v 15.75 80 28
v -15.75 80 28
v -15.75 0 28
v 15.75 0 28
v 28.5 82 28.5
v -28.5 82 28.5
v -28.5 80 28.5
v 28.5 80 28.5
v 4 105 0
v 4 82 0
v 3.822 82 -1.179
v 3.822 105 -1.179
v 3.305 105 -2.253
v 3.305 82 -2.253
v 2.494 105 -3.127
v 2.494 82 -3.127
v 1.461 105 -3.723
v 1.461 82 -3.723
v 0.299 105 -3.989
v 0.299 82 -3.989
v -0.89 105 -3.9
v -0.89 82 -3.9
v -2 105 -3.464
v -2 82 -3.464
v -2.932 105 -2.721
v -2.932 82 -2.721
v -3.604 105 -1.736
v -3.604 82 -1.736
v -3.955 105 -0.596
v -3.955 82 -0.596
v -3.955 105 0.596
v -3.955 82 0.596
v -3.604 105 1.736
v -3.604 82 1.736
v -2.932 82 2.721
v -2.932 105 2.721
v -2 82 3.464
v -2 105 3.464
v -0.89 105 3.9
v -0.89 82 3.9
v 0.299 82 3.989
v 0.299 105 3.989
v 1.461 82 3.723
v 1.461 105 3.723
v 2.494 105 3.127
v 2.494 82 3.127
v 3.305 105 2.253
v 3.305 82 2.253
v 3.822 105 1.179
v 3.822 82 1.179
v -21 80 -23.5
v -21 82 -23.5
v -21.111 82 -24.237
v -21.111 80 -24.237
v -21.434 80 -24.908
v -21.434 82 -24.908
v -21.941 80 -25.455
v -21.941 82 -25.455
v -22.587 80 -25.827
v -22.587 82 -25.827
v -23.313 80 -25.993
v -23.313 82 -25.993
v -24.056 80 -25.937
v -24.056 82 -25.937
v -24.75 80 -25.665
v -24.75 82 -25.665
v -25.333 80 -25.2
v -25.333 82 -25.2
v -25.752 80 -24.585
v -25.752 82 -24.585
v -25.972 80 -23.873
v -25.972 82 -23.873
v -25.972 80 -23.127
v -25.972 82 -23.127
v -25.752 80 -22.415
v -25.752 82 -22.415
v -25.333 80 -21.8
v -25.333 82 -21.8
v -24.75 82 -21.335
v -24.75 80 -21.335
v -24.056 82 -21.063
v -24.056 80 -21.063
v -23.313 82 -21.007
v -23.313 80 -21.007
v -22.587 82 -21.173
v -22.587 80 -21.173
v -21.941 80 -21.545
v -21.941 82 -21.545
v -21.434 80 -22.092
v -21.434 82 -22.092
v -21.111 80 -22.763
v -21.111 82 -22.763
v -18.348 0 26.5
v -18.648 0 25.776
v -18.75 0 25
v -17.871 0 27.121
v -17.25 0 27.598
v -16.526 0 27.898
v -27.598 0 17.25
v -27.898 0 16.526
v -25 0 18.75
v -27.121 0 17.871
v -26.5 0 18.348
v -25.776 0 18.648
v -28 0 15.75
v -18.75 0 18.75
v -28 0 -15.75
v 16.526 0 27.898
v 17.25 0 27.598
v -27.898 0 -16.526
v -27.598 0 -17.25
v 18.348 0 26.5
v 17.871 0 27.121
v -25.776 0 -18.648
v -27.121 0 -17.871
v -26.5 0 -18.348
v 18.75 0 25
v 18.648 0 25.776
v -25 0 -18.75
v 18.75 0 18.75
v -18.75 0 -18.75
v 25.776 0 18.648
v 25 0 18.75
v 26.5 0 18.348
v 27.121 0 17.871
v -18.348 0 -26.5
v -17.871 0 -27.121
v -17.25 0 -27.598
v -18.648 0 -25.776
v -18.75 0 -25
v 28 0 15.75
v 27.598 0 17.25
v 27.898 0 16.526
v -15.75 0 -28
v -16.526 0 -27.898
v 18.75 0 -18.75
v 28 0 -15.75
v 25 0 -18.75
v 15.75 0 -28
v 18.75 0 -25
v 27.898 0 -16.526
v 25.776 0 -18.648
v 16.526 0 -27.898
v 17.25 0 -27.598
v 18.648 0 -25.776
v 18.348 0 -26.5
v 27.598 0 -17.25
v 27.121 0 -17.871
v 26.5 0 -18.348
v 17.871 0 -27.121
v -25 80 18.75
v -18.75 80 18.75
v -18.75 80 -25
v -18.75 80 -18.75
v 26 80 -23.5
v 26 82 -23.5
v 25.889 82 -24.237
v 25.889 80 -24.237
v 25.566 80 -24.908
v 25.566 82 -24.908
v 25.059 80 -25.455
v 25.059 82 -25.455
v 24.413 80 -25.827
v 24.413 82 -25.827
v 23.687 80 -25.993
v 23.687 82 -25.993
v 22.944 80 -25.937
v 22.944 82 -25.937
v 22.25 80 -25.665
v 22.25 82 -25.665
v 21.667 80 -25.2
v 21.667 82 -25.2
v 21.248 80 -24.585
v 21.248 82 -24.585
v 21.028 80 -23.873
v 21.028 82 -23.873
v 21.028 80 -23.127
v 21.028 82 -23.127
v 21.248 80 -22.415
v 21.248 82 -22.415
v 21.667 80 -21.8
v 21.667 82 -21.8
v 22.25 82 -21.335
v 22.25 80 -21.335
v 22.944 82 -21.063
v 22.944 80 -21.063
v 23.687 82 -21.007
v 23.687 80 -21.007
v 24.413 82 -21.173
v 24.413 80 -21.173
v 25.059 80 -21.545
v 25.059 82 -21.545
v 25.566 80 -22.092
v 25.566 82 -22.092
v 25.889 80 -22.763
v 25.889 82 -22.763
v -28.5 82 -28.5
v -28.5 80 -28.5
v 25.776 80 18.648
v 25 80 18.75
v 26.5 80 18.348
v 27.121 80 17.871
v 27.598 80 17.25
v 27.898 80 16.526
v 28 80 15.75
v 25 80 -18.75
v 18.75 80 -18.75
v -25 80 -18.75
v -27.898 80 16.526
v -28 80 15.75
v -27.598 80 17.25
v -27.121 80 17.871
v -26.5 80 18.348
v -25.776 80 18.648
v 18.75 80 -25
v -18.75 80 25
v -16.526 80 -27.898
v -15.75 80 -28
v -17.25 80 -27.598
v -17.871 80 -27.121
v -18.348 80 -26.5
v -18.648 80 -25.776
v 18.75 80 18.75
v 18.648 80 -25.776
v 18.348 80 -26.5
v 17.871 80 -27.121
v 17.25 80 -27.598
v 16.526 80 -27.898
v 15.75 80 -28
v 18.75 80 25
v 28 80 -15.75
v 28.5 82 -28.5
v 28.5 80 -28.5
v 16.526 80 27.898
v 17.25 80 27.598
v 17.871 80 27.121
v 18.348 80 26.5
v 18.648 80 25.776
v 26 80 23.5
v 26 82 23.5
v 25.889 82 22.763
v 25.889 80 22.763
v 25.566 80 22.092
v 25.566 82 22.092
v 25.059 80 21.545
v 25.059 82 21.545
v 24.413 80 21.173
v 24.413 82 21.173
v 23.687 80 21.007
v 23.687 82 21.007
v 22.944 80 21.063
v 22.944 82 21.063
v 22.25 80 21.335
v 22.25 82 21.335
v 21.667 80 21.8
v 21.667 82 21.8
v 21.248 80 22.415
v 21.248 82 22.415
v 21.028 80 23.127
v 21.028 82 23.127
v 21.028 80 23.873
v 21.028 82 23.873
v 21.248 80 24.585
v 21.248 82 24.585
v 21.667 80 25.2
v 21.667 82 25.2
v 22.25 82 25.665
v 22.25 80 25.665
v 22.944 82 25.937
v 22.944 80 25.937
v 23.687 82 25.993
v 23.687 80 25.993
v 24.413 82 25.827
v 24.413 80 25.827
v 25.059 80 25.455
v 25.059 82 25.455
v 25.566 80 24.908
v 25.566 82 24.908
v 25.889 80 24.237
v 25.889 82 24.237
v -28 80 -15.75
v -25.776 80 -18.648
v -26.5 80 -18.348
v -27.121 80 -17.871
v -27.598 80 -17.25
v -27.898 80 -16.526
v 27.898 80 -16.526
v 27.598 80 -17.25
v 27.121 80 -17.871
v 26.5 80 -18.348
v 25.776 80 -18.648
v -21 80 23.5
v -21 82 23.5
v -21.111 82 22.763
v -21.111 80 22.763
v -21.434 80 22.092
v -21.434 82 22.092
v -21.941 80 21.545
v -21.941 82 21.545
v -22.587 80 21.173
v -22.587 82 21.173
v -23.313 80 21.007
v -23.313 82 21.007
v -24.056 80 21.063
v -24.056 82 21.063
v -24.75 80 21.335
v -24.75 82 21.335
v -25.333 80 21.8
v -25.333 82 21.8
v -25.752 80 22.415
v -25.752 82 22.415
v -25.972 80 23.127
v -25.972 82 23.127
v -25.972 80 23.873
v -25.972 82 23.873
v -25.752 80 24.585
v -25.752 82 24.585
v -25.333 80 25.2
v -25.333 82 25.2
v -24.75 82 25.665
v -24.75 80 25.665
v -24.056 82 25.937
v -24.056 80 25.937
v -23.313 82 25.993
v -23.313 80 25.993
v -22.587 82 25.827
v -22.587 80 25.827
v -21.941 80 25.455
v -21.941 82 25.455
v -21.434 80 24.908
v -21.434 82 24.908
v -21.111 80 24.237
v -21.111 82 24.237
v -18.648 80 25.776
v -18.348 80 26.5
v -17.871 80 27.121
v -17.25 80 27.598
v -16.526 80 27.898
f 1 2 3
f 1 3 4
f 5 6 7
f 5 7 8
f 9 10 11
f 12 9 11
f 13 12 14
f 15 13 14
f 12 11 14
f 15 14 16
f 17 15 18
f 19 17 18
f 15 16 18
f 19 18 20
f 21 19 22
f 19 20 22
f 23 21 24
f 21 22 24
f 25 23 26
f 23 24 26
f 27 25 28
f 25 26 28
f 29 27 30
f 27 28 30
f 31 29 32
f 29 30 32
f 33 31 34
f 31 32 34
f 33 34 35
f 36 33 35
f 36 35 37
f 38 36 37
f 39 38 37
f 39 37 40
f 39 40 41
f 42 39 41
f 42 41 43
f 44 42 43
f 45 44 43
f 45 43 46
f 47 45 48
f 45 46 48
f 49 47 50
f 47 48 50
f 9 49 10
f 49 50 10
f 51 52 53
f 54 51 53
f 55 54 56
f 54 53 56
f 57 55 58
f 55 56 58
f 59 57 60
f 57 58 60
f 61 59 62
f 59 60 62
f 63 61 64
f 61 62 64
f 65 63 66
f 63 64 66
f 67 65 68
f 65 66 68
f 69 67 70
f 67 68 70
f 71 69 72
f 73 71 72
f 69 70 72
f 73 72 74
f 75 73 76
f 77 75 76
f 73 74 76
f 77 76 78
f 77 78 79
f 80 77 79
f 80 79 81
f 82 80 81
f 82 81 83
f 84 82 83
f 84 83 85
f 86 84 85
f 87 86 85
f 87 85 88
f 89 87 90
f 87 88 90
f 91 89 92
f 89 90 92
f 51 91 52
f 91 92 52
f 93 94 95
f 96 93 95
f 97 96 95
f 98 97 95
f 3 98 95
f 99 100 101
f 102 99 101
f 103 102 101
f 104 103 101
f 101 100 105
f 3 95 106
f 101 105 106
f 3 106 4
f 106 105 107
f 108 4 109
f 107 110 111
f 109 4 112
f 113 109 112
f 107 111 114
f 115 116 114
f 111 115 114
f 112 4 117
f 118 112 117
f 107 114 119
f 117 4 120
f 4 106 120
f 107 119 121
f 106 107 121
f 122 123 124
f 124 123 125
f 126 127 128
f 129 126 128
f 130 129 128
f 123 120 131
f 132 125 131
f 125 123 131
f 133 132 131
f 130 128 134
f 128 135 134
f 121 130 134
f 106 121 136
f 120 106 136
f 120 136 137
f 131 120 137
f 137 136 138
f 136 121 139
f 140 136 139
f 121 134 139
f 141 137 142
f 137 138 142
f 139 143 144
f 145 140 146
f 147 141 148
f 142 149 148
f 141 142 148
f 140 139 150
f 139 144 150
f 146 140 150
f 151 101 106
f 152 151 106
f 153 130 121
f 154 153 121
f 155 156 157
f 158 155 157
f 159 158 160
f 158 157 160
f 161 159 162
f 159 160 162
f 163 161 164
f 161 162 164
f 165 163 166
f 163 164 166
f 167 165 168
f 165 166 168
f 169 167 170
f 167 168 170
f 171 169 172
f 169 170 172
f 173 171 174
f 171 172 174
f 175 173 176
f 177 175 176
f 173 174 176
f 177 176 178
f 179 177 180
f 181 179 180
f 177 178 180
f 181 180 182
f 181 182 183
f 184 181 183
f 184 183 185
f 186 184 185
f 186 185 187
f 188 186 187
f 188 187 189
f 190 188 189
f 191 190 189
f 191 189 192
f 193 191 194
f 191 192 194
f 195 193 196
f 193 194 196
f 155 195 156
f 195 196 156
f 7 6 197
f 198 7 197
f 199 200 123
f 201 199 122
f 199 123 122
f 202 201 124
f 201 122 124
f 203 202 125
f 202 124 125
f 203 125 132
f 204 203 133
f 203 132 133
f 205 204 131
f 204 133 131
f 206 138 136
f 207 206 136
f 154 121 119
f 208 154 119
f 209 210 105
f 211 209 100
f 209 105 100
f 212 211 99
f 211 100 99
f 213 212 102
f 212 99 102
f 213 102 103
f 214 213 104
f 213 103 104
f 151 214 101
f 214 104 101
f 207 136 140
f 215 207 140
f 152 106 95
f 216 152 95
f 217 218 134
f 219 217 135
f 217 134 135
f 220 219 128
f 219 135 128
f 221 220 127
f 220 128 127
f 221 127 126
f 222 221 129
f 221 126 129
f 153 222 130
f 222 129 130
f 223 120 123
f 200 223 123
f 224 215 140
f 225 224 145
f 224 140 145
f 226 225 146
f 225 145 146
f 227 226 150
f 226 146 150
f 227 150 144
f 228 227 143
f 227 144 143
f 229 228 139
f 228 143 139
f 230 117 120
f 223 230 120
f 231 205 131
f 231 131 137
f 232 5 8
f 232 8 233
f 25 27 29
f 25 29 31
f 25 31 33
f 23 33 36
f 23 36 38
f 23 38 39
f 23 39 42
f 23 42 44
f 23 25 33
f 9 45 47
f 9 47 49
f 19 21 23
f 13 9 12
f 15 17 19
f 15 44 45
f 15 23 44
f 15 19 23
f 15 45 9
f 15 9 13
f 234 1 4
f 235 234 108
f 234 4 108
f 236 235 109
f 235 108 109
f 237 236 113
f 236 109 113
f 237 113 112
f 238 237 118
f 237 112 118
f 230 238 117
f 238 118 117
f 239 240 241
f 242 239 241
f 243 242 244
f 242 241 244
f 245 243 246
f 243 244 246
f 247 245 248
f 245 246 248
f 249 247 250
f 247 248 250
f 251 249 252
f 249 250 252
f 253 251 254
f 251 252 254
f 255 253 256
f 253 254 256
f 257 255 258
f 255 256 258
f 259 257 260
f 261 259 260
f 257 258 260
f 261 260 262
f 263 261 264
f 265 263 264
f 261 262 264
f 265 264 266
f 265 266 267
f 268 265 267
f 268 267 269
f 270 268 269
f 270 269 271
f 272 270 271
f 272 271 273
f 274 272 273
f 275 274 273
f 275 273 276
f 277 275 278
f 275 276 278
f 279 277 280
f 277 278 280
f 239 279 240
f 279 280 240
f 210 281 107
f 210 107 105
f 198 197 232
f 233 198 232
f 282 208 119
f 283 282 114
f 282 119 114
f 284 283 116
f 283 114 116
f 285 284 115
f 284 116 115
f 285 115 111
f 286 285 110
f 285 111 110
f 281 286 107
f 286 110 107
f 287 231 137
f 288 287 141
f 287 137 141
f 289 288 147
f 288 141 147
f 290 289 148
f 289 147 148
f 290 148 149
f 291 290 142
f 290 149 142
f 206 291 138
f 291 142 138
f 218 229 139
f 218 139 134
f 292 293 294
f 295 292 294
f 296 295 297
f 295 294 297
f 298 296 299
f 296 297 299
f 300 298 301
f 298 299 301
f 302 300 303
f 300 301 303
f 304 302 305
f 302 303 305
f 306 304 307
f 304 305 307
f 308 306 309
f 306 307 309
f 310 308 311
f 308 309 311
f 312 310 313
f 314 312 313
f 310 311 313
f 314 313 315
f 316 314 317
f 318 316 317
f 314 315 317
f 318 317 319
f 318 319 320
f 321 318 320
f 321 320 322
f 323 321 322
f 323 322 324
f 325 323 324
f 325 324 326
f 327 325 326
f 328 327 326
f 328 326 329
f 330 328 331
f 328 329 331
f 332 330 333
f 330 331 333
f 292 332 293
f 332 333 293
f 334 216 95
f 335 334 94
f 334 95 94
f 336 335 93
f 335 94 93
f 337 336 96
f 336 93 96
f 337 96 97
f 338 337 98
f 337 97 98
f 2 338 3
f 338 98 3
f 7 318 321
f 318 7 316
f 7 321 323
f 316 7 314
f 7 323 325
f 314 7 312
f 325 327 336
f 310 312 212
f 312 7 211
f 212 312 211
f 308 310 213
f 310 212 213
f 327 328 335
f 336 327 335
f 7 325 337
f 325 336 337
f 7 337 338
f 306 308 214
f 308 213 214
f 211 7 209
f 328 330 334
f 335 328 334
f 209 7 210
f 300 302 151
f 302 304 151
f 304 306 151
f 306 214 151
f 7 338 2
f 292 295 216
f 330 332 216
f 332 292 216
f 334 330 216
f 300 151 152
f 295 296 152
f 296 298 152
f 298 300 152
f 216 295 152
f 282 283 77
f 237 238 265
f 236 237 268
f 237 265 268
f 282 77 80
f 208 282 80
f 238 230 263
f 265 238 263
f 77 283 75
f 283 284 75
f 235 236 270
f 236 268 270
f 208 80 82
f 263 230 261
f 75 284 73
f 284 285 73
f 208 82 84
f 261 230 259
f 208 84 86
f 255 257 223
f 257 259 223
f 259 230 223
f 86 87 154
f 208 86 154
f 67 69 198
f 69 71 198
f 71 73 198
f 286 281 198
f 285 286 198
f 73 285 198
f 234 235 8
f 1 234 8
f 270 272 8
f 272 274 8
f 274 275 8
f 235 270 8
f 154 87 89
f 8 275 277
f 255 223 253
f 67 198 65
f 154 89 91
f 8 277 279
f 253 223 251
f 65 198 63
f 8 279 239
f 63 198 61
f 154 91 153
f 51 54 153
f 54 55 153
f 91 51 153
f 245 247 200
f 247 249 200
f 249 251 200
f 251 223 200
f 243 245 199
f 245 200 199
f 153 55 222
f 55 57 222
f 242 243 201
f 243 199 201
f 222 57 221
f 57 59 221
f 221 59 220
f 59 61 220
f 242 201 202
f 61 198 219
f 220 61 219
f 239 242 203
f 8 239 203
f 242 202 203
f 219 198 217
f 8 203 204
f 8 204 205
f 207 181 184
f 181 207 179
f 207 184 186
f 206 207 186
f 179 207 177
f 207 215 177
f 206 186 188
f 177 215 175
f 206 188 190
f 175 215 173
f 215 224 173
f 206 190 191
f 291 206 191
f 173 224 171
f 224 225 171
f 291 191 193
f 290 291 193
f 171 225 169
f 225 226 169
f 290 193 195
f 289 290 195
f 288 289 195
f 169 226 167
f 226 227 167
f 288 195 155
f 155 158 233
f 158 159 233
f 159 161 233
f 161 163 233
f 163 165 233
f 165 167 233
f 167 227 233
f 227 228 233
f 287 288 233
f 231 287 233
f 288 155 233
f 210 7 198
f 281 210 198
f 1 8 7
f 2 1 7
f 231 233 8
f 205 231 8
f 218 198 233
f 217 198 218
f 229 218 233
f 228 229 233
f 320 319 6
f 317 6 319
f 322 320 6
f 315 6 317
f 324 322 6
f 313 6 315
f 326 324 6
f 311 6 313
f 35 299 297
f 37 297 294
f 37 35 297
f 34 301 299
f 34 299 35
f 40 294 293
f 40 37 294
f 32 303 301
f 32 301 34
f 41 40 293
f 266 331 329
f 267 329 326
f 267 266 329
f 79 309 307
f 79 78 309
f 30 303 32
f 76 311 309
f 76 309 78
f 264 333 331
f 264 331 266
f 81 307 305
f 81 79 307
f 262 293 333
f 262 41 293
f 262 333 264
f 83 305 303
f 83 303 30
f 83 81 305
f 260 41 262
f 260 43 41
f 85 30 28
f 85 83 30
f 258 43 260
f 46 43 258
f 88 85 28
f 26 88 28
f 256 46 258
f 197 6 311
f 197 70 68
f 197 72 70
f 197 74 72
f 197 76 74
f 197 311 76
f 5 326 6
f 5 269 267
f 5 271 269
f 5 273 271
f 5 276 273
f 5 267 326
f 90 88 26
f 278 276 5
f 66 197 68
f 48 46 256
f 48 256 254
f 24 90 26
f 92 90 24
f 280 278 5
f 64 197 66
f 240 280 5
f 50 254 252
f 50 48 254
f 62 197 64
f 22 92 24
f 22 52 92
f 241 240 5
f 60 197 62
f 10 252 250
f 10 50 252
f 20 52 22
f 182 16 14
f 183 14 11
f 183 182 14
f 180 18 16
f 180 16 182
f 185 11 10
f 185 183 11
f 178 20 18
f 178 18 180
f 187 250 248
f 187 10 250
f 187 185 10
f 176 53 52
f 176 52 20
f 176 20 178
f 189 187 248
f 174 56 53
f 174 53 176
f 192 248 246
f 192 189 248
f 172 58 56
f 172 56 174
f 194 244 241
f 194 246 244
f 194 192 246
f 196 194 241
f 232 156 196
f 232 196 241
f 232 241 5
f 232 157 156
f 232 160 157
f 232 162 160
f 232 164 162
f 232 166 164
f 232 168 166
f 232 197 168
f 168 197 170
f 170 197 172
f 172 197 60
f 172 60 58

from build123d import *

# Parameters (mm, degrees)
SKETCH_1_W          = 37.5
SKETCH_1_H          = 37.5
EXTRUDE_1_DEPTH     = 82
SKETCH_2_W          = 57
SKETCH_2_H          = 57
EXTRUDE_2_DEPTH     = 2
SKETCH_3_R          = 2.5
CUT_EXTRUDE_1_DEPTH = 2
SKETCH_4_R          = 4
EXTRUDE_3_DEPTH     = 23


with BuildPart() as part:
    # 草图1 → 凸台-拉伸1 (new body)
    with BuildSketch(Plane(origin=(0, 0, 0), x_dir=(1, 0, 0), z_dir=(0, 1, 0))):
        with BuildLine():
            Line((-18.75, 18.75), (-25, 18.75))
            ThreePointArc((-25, 18.75), (-27.121320344, 17.871320344), (-28, 15.75))
            Line((-28, 15.75), (-28, -15.75))
            ThreePointArc((-28, -15.75), (-27.121320344, -17.871320344), (-25, -18.75))
            Line((-25, -18.75), (-18.75, -18.75))
            Line((-18.75, -18.75), (-18.75, 18.75))
        make_face()
        Rectangle(SKETCH_1_W, SKETCH_1_H)
        with BuildLine():
            Line((25, 18.75), (18.75, 18.75))
            Line((18.75, 18.75), (18.75, -18.75))
            Line((18.75, -18.75), (25, -18.75))
            ThreePointArc((25, -18.75), (27.121320344, -17.871320344), (28, -15.75))
            Line((28, -15.75), (28, 15.75))
            ThreePointArc((28, 15.75), (27.121320344, 17.871320344), (25, 18.75))
        make_face()
        with BuildLine():
            Line((18.75, -18.75), (-18.75, -18.75))
            Line((-18.75, -18.75), (-18.75, -25))
            ThreePointArc((-18.75, -25), (-17.871320344, -27.121320344), (-15.75, -28))
            Line((-15.75, -28), (15.75, -28))
            ThreePointArc((15.75, -28), (17.871320344, -27.121320344), (18.75, -25))
            Line((18.75, -25), (18.75, -18.75))
        make_face()
        with BuildLine():
            Line((-18.75, 25), (-18.75, 18.75))
            Line((-18.75, 18.75), (18.75, 18.75))
            Line((18.75, 18.75), (18.75, 25))
            ThreePointArc((18.75, 25), (17.871320344, 27.121320344), (15.75, 28))
            Line((15.75, 28), (-15.75, 28))
            ThreePointArc((-15.75, 28), (-17.871320344, 27.121320344), (-18.75, 25))
        make_face()
    extrude(amount=EXTRUDE_1_DEPTH)

    # 草图2 → 凸台-拉伸2 (add)
    with BuildSketch(Plane(origin=(0, 82, 0), x_dir=(1, 0, 0), z_dir=(0, 1, 0))):
        Rectangle(SKETCH_2_W, SKETCH_2_H)
    extrude(amount=-EXTRUDE_2_DEPTH)

    # 草图3 → 切除-拉伸1 (cut)
    with BuildSketch(Plane(origin=(0, 82, 0), x_dir=(1, 0, 0), z_dir=(0, 1, 0))):
        with Locations((23.5, 23.5)):
            Circle(SKETCH_3_R)
        with Locations((-23.5, 23.5)):
            Circle(SKETCH_3_R)
        with Locations((-23.5, -23.5)):
            Circle(SKETCH_3_R)
        with Locations((23.5, -23.5)):
            Circle(SKETCH_3_R)
    extrude(amount=-CUT_EXTRUDE_1_DEPTH, mode=Mode.SUBTRACT)

    # 草图4 → 凸台-拉伸3 (add)
    with BuildSketch(Plane(origin=(0, 82, 0), x_dir=(1, 0, 0), z_dir=(0, 1, 0))):
        Circle(SKETCH_4_R)
    extrude(amount=EXTRUDE_3_DEPTH)


solid = part.part
